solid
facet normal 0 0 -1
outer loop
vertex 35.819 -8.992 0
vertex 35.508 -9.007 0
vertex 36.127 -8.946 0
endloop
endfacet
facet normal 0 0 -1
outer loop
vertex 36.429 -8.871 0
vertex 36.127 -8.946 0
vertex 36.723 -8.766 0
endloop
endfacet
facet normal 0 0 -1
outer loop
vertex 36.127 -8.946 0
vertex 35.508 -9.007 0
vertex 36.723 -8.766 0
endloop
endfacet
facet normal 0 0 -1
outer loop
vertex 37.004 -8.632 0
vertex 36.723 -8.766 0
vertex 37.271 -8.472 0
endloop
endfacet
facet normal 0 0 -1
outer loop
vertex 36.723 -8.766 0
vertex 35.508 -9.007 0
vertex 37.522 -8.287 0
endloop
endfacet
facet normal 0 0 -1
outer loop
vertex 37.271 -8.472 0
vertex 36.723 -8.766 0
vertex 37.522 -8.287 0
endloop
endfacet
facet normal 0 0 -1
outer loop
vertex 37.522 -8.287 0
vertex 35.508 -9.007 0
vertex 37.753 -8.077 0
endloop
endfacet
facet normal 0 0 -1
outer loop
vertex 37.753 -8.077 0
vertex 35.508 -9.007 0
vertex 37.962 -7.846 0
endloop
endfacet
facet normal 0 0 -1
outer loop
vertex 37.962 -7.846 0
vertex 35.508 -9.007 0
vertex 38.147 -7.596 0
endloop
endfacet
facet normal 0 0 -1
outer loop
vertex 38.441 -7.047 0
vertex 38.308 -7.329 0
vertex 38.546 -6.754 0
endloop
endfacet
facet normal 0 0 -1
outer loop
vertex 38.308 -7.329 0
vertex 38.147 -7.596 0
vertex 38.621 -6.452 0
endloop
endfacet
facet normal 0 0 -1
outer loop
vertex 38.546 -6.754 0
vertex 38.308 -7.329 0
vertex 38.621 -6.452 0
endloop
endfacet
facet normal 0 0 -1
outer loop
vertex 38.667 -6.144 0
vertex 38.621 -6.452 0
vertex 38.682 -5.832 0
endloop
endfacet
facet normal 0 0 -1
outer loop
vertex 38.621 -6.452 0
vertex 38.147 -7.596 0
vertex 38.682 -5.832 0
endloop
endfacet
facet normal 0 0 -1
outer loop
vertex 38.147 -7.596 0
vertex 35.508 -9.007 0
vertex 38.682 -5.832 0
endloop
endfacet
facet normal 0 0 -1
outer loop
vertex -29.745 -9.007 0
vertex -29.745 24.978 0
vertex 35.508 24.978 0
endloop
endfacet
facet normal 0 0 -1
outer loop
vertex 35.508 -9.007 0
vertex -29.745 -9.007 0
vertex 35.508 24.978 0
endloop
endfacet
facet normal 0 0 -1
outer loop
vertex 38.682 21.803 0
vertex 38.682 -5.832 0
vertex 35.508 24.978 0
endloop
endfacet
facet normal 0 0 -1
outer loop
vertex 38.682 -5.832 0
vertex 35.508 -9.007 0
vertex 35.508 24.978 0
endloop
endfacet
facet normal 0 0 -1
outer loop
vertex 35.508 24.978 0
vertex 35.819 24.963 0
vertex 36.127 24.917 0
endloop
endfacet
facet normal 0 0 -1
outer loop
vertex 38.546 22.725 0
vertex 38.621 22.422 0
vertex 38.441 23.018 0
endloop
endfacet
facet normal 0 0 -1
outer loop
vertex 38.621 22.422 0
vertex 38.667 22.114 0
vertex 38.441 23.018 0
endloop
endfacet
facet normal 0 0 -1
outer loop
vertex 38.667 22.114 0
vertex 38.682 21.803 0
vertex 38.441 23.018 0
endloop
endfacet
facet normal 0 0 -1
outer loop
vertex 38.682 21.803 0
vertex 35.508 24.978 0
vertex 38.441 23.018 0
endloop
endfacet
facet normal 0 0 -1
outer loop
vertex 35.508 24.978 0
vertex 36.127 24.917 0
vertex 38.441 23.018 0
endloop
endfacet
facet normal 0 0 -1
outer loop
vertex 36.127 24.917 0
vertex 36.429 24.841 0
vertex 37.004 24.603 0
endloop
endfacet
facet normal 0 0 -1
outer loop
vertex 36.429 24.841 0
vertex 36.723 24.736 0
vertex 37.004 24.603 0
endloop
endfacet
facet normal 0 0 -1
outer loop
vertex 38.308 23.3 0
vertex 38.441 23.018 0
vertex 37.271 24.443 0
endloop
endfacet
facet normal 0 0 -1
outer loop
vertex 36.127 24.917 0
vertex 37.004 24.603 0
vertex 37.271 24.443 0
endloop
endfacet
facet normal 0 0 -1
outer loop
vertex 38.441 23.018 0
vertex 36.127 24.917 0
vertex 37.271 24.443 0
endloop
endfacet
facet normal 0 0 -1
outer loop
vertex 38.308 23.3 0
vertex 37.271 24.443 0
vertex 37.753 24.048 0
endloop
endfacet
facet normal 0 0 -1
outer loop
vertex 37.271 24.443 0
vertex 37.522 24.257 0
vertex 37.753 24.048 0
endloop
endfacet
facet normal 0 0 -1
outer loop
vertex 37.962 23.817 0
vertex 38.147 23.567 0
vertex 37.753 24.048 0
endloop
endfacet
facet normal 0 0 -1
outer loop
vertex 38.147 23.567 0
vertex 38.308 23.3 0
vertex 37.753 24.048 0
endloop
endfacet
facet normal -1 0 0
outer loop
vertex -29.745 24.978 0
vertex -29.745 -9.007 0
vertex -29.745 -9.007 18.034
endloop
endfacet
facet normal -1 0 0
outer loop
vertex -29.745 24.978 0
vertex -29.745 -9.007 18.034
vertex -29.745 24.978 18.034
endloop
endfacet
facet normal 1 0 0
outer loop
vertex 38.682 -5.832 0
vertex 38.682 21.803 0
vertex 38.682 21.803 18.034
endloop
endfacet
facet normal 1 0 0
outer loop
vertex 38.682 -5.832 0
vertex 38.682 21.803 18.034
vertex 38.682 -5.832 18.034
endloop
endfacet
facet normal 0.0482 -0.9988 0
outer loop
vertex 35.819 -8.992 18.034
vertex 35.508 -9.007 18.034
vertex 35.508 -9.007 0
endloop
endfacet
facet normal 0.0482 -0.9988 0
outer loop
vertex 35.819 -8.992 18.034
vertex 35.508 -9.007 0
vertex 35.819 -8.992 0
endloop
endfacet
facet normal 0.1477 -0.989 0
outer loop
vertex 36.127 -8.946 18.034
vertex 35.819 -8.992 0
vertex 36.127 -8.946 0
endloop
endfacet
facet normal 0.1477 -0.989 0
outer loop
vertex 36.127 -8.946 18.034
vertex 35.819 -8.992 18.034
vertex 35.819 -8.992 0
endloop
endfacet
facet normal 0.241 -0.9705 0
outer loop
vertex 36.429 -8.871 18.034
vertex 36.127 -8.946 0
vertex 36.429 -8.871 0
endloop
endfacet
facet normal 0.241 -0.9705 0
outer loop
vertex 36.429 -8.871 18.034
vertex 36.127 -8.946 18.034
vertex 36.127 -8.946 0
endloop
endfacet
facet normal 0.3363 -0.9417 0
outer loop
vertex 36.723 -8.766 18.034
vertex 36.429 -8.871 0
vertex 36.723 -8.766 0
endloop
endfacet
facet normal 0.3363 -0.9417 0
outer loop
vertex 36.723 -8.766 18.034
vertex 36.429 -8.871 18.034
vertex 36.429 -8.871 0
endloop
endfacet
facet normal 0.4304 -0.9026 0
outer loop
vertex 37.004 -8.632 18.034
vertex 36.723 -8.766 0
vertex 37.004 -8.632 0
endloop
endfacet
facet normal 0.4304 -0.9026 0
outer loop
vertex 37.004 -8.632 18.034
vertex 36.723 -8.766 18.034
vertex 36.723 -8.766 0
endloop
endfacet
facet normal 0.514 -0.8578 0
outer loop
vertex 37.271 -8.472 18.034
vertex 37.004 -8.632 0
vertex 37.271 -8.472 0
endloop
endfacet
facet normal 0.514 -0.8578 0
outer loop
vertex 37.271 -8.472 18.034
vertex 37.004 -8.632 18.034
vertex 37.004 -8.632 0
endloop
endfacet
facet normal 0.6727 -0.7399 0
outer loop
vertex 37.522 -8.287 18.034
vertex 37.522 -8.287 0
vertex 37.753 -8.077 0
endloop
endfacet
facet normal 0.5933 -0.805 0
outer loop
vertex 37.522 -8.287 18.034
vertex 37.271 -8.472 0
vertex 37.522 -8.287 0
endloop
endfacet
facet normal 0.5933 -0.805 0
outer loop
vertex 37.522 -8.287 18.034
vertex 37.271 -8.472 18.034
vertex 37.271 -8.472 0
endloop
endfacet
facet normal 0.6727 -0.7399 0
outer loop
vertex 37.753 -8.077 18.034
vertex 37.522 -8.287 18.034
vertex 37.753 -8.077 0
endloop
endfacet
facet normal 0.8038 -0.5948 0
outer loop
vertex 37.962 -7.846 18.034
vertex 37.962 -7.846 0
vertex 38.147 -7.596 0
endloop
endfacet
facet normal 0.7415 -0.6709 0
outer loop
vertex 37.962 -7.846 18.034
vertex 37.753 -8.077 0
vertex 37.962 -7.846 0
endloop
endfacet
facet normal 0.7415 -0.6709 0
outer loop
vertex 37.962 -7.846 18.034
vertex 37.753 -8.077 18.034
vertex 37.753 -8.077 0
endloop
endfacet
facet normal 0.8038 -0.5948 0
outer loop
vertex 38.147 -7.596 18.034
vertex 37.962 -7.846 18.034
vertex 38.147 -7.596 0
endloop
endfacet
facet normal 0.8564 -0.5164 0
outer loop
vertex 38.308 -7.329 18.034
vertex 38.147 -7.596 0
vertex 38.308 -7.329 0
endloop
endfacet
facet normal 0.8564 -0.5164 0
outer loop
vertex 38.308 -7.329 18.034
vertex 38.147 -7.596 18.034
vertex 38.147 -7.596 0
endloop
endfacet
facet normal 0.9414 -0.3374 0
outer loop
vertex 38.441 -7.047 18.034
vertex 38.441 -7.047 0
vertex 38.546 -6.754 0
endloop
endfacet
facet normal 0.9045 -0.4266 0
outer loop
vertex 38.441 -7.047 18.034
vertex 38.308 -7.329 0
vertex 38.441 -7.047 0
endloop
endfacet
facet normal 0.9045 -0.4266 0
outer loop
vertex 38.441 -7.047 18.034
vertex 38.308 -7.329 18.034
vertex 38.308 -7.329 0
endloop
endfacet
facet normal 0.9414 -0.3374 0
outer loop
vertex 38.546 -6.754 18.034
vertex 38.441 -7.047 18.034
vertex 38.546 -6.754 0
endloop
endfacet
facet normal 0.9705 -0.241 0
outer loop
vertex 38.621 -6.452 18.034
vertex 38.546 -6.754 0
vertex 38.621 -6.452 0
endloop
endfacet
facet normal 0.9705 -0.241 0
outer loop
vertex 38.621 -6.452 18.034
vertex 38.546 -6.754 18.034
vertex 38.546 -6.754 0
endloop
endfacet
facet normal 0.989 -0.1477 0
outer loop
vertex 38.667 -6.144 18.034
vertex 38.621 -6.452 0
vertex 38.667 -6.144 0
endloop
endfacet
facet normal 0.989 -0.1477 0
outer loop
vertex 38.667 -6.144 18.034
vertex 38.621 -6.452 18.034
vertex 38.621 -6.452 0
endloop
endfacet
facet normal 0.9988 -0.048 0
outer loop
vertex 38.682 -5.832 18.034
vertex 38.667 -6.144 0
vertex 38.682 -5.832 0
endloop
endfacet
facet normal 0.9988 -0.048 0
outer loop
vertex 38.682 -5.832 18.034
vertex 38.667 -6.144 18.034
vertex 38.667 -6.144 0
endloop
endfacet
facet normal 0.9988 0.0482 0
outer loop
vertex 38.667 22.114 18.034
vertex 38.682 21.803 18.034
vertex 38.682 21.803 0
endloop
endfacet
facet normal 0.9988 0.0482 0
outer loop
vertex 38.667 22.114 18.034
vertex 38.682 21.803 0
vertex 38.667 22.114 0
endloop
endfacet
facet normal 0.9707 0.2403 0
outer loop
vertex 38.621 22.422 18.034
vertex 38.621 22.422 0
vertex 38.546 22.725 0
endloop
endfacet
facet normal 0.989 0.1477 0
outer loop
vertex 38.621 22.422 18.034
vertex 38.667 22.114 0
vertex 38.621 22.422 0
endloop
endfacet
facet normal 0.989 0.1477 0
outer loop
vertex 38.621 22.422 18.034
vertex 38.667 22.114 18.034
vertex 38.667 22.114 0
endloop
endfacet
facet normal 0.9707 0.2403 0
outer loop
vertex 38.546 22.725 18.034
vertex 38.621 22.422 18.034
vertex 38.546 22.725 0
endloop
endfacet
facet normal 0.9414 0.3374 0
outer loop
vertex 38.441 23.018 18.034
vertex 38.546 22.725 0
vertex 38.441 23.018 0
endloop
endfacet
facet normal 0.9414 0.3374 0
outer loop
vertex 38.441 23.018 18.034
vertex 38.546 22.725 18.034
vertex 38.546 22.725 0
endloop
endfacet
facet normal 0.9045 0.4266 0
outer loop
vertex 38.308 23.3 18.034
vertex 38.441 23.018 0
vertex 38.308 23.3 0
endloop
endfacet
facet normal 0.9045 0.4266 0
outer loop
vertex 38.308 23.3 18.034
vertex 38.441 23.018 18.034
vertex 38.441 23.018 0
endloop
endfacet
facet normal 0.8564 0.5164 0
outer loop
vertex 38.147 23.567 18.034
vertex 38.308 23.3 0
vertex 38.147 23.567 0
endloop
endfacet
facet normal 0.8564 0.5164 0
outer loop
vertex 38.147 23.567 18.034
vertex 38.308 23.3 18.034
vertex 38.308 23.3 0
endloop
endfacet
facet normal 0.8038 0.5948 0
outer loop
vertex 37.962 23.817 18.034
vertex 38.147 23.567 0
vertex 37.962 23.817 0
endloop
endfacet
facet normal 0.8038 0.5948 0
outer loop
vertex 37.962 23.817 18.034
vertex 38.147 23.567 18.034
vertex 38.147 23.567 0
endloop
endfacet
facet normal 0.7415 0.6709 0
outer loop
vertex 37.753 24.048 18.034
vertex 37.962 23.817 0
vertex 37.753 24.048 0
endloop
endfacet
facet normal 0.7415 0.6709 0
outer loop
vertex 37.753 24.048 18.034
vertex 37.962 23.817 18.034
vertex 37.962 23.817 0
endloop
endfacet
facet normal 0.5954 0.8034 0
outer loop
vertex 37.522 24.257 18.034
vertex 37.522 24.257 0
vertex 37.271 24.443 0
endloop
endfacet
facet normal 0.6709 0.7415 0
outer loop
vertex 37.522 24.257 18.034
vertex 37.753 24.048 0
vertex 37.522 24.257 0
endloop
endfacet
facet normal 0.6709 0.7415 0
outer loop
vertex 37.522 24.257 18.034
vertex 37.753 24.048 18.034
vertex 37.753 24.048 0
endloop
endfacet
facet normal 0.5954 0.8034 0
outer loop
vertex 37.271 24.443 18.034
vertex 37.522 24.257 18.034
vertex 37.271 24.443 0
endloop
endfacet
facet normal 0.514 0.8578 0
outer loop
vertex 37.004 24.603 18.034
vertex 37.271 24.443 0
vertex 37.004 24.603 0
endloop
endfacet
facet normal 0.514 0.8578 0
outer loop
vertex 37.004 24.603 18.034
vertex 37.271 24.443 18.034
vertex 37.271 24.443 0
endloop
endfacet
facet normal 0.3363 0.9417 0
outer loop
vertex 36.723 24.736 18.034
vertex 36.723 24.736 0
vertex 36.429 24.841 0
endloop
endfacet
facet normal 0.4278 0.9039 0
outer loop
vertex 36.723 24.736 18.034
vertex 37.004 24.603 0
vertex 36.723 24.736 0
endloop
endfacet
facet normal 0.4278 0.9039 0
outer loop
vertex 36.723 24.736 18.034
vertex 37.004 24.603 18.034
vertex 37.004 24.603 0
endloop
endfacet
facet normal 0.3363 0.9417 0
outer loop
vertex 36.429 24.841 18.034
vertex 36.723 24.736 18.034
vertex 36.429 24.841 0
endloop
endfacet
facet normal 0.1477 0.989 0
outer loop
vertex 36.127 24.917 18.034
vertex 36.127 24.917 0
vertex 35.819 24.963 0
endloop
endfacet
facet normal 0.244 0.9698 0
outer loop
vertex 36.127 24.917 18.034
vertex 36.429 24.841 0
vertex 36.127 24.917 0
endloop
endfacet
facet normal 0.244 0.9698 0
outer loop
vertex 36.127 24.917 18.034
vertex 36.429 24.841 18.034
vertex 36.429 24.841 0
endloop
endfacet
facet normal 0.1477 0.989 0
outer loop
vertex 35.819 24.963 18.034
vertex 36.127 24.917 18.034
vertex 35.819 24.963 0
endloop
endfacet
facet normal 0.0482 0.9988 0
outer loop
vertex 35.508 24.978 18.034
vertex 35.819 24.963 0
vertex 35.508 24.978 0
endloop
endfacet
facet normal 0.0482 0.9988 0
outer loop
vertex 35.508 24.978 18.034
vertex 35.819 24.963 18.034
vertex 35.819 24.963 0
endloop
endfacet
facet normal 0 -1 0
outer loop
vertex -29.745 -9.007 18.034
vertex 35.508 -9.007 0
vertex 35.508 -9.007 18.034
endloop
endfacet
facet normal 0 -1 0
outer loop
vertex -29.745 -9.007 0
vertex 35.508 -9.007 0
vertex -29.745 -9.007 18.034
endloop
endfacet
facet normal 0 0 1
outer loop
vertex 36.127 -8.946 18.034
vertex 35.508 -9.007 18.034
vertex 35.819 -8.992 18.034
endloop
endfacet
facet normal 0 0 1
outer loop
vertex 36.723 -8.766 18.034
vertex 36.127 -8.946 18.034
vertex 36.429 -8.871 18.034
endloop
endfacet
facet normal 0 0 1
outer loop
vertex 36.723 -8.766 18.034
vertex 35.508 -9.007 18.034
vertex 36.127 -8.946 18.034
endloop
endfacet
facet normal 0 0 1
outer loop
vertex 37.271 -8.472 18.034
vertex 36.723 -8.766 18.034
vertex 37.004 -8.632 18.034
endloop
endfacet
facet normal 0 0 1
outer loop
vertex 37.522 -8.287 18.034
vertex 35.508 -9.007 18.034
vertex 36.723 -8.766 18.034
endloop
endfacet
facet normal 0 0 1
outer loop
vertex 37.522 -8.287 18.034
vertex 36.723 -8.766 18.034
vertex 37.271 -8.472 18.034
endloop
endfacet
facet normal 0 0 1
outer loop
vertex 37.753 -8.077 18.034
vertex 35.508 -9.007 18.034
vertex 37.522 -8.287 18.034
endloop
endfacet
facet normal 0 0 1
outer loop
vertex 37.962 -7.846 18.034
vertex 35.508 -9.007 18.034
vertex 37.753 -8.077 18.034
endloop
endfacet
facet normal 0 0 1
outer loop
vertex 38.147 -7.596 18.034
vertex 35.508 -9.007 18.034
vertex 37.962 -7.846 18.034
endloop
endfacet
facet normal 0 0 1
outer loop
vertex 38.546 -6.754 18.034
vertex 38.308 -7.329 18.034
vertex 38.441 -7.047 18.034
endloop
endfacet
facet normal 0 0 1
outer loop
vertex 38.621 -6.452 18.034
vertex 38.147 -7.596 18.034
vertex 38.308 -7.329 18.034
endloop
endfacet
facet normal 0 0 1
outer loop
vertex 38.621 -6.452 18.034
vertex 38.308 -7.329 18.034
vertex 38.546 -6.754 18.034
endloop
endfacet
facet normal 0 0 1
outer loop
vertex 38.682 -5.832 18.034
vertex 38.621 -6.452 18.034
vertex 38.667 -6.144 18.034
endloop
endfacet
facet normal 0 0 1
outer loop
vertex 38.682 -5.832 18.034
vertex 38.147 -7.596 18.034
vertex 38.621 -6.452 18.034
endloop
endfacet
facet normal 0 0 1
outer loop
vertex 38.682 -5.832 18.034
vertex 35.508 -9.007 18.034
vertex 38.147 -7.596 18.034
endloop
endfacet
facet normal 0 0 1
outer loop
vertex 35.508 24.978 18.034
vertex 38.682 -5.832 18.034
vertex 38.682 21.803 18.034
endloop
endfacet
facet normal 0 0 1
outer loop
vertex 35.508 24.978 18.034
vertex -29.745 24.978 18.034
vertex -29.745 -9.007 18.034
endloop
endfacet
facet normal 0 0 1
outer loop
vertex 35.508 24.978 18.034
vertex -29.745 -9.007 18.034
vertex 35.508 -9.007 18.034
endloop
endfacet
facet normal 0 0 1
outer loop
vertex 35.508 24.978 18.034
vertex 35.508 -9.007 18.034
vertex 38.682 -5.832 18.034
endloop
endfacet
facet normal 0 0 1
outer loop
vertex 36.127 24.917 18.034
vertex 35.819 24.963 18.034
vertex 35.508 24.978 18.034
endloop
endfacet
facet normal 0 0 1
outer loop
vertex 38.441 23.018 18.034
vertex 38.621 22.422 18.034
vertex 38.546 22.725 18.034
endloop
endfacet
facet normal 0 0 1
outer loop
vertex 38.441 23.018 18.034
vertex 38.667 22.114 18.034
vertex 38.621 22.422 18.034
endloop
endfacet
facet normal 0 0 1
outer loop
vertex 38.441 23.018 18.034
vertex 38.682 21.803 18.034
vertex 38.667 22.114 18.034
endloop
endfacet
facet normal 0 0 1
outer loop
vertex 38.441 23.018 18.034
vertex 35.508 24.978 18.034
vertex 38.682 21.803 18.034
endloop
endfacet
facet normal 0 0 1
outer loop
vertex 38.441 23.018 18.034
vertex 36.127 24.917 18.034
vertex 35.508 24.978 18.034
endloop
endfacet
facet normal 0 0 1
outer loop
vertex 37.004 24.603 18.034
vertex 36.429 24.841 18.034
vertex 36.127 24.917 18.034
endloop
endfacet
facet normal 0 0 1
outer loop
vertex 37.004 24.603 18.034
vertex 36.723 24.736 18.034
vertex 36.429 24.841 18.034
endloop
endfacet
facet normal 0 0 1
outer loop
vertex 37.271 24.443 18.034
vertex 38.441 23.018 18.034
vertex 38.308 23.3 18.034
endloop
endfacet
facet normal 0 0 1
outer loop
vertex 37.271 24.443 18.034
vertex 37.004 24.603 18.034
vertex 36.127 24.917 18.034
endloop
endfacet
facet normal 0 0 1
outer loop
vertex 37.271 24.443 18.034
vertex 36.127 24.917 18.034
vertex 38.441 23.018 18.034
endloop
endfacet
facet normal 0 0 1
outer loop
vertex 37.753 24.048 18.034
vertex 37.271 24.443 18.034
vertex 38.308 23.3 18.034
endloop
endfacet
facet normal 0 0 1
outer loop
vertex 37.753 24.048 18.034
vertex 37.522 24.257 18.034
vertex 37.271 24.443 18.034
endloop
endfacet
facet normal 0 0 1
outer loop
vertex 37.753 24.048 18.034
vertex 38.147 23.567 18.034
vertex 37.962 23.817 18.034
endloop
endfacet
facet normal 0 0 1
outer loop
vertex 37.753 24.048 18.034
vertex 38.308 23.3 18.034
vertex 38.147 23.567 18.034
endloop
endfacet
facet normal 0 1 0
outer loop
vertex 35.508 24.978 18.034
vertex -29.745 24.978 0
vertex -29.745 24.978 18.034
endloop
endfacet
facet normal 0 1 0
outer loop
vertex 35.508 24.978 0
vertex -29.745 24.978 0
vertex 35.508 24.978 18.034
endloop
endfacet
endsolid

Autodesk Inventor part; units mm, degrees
ref_plane "YZ Plane" through (0, 0, 0) normal (1, 0, 0) x (0, 1, 0)
ref_plane "XZ Plane" through (0, 0, 0) normal (0, 1, 0) x (-1, 0, 0)
ref_plane "XY Plane" through (0, 0, 0) normal (0, 0, 1) x (1, 0, 0)
sketch "Sketch1" plane through (0, 0, 0) normal (0, 0, 1) x (1, 0, 0)
  line L0 (-29.7451, 24.9779) -> (38.6825, 24.9779)
  line L1 (38.6825, 24.9779) -> (38.6825, -9.0073)
  line L2 (38.6825, -9.0073) -> (-29.7451, -9.0073)
  line L3 (-29.7451, -9.0073) -> (-29.7451, 24.9779)
  point P0 (0, 0)
  dimension "d0" = 68.4276
  dimension "d1" = 33.9852
extrude "Extrusion1" add sketch "Sketch1" along normal blind 18.034
fillet "Fillet1" radius 3.175 1 edges at (38.6825, 24.9779, 9.017)
fillet "Fillet2" radius 3.175 1 edges at (38.6825, -9.0073, 9.017)
properties part number "Aidan Sherry Battery Pack"
